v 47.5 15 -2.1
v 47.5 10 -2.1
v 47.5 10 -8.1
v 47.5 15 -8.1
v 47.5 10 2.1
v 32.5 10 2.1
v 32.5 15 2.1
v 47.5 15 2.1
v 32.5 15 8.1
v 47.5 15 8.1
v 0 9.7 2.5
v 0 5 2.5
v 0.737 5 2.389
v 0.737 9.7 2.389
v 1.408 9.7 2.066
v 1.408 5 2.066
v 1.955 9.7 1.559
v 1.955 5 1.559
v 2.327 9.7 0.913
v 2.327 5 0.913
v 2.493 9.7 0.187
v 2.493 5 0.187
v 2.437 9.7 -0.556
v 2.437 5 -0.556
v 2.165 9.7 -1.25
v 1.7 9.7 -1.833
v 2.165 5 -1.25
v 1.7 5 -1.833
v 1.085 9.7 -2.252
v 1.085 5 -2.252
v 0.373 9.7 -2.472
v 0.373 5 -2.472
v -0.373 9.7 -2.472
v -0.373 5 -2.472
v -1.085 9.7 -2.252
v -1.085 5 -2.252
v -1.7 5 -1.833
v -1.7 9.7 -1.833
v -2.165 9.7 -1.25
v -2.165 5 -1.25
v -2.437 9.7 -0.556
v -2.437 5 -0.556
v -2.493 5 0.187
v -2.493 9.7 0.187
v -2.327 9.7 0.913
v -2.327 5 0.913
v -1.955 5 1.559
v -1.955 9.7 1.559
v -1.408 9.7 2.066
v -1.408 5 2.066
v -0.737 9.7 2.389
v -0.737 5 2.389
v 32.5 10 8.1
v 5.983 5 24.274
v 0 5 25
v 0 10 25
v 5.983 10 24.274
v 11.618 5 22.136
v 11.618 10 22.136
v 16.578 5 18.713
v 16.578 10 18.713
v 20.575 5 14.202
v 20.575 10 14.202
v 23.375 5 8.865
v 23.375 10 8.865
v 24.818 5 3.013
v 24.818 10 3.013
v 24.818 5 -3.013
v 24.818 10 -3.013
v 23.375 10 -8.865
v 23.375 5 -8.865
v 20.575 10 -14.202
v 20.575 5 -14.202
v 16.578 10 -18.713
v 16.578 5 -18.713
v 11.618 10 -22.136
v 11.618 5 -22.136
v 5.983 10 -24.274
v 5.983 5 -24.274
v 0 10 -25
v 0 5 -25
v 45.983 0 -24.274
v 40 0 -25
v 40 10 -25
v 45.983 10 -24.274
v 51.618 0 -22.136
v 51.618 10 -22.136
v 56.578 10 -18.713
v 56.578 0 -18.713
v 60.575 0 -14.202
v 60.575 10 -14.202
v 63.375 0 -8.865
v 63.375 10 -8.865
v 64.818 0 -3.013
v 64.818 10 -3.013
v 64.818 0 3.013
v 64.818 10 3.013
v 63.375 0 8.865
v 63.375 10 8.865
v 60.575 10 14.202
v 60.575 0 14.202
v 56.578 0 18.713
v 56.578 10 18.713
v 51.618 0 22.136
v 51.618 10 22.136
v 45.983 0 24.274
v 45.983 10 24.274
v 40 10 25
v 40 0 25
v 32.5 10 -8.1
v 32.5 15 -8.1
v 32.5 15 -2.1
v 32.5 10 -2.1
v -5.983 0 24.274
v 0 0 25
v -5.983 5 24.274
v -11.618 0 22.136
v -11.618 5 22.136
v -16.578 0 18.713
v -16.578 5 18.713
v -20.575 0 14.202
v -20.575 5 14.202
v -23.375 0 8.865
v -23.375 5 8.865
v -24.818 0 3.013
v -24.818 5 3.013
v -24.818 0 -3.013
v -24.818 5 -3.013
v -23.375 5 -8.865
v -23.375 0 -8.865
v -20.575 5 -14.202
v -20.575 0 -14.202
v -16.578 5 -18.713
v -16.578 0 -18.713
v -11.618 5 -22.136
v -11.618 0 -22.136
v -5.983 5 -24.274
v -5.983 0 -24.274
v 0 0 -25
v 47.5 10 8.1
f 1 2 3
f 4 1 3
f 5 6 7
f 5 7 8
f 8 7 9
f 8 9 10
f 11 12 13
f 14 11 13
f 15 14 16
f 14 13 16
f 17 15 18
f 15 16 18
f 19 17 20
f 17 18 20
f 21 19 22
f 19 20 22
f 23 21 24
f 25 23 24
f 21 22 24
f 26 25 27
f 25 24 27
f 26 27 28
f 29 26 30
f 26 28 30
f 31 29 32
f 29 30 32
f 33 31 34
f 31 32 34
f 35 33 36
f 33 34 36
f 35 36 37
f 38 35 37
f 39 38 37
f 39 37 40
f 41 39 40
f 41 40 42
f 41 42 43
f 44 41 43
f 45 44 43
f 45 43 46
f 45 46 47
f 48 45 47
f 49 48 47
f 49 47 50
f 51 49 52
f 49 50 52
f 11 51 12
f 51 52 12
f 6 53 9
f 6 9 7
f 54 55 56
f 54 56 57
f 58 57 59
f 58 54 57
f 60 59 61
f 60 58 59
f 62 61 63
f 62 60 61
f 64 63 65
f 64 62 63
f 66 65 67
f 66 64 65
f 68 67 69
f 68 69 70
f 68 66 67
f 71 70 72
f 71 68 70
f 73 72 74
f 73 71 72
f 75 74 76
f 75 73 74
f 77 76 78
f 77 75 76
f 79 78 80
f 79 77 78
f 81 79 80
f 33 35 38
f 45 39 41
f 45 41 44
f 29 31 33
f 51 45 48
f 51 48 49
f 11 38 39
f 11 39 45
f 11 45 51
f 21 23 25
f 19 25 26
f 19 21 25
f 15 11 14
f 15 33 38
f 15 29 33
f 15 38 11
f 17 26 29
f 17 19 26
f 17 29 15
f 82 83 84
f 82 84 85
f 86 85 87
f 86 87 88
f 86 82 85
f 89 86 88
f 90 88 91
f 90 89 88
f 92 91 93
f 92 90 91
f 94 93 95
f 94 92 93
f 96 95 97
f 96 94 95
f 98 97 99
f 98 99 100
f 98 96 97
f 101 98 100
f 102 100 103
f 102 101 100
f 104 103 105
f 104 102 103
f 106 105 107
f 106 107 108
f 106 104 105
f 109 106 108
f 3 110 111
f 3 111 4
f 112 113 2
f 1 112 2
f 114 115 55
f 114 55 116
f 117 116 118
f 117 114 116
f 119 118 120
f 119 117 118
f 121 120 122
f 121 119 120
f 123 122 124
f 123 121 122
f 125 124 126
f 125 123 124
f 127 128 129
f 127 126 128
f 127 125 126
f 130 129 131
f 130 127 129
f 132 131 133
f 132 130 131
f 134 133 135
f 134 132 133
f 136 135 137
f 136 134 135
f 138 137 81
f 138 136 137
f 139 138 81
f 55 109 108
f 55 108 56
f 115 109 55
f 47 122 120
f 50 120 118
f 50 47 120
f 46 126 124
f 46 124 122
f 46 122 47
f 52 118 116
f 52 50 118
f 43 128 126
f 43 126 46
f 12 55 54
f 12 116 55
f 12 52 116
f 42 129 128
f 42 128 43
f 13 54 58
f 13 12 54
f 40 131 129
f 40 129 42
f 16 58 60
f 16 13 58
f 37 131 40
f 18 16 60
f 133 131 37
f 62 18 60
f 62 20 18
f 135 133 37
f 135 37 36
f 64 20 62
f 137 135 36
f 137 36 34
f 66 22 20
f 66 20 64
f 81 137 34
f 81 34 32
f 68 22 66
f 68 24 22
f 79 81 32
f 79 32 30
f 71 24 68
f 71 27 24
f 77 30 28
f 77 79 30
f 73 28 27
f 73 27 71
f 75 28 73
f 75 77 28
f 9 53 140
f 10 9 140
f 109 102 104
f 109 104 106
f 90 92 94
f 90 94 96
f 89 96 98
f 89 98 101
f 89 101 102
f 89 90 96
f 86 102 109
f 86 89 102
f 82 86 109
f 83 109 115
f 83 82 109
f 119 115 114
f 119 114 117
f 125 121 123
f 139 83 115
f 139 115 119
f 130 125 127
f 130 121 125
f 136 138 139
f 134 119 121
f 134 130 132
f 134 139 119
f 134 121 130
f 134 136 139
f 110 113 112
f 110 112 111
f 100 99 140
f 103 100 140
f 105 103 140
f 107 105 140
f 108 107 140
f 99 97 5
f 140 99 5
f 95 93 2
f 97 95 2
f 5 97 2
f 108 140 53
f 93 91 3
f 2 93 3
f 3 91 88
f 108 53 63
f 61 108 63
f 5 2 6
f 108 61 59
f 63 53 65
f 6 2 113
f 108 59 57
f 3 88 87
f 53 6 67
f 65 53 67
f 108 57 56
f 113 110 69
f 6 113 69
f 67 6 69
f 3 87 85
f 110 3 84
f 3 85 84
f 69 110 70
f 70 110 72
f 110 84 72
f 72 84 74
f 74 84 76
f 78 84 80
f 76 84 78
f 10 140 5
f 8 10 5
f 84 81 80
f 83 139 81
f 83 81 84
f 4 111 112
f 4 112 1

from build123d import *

# Parameters (mm, degrees)
EXTRUDE_1_DEPTH     = 10
CUT_EXTRUDE_START   = -5
SKETCH_2_R          = 25
CUT_EXTRUDE_1_DEPTH = 5
SKETCH_3_R          = 2.5
EXTRUDE_2_DEPTH     = 4.7
SKETCH_4_W          = 15
SKETCH_4_H          = 6
EXTRUDE_3_DEPTH     = 5


with BuildPart() as part:
    # 草圖1 → 填料-伸長1 (new body)
    with BuildSketch(Plane(origin=(0, 0, 0), x_dir=(1, 0, 0), z_dir=(0, 1, 0))):
        with BuildLine():
            Line((0, 25), (40, 25))
            ThreePointArc((40, 25), (65, 0), (40, -25))
            Line((40, -25), (0, -25))
            ThreePointArc((0, -25), (-25, 0), (0, 25))
        make_face()
    extrude(amount=EXTRUDE_1_DEPTH)

    # 草圖2 → 除料-伸長1 (cut)
    with BuildSketch(Plane(origin=(0, 10, 0), x_dir=(1, 0, 0), z_dir=(0, 1, 0)).offset(CUT_EXTRUDE_START)):
        Circle(SKETCH_2_R)
    extrude(amount=CUT_EXTRUDE_1_DEPTH, mode=Mode.SUBTRACT)

    # 草圖3 → 填料-伸長2 (add)
    with BuildSketch(Plane(origin=(0, 5, 0), x_dir=(1, 0, 0), z_dir=(0, 1, 0))):
        with Locations(Location((0, 0, 0), (0, 0, 270))):
            Circle(SKETCH_3_R)
    extrude(amount=EXTRUDE_2_DEPTH)

    # 草圖4 → 填料-伸長3 (add)
    with BuildSketch(Plane(origin=(0, 10, 0), x_dir=(1, 0, 0), z_dir=(0, 1, 0))):
        with Locations((40, 5.1)):
            Rectangle(SKETCH_4_W, SKETCH_4_H)
        with Locations((40, -5.1)):
            Rectangle(SKETCH_4_W, SKETCH_4_H)
    extrude(amount=EXTRUDE_3_DEPTH)


solid = part.part
